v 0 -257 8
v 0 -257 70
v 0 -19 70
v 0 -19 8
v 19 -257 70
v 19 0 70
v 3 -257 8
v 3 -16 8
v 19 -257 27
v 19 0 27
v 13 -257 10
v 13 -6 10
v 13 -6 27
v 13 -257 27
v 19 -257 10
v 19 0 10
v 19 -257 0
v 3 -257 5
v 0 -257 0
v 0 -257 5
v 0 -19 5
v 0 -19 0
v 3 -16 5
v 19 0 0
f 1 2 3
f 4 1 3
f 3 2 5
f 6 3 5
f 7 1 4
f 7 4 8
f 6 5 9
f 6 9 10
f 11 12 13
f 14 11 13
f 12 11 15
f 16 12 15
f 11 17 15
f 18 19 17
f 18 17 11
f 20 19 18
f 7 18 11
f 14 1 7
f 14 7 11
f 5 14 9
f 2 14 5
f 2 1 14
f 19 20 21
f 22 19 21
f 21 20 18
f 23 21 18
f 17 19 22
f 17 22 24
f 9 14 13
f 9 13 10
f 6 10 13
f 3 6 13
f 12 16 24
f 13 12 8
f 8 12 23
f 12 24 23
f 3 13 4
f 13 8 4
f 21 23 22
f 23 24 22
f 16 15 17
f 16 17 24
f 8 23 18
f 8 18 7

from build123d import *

# Parameters (mm, degrees)
F0_W        = 257
F0_H        = 70
F1_DEPTH    = 19
F2_W        = 3
F2_H        = 3
F3_DEPTH    = 257.001
F4_W        = 6
F4_H        = 17
F5_DEPTH    = 257.001
F6_T1_DEPTH = 159.7239535427


# Not quite as in the source:
# - a fillet or chamfer that OpenCascade refuses, or shapes differently, is made with other operations: its cross-section is extruded or revolved along the edge and cut away or added


with BuildPart() as f1:
    # F0 (on Right) → F1 (new body)
    with BuildSketch(Plane.YZ):
        with Locations((-128.5, 35)):
            Rectangle(F0_W, F0_H)
    extrude(amount=F1_DEPTH)

    # F2 (on face) → F3 (cut, through all)
    with BuildSketch(Plane.XZ.offset(257)):
        with Locations((1.5, 6.5)):
            Rectangle(F2_W, F2_H)
    extrude(amount=-F3_DEPTH, mode=Mode.SUBTRACT)

    # F4 (on face) → F5 (cut, through all)
    with BuildSketch(Plane.XZ.offset(257)):
        with Locations((16, 18.5)):
            Rectangle(F4_W, F4_H)
    extrude(amount=-F5_DEPTH, mode=Mode.SUBTRACT)

    # F6: chamfer of 19 on 1 edges, made by hand

    # F6_s2 → F6_t1 (cut)
    with BuildSketch(Plane.XY.offset(-40.8619767714)):
        Polygon((19, 0), (0, -19), (0, 0), align=None)
    extrude(amount=F6_T1_DEPTH, mode=Mode.SUBTRACT)


solid = f1.part
